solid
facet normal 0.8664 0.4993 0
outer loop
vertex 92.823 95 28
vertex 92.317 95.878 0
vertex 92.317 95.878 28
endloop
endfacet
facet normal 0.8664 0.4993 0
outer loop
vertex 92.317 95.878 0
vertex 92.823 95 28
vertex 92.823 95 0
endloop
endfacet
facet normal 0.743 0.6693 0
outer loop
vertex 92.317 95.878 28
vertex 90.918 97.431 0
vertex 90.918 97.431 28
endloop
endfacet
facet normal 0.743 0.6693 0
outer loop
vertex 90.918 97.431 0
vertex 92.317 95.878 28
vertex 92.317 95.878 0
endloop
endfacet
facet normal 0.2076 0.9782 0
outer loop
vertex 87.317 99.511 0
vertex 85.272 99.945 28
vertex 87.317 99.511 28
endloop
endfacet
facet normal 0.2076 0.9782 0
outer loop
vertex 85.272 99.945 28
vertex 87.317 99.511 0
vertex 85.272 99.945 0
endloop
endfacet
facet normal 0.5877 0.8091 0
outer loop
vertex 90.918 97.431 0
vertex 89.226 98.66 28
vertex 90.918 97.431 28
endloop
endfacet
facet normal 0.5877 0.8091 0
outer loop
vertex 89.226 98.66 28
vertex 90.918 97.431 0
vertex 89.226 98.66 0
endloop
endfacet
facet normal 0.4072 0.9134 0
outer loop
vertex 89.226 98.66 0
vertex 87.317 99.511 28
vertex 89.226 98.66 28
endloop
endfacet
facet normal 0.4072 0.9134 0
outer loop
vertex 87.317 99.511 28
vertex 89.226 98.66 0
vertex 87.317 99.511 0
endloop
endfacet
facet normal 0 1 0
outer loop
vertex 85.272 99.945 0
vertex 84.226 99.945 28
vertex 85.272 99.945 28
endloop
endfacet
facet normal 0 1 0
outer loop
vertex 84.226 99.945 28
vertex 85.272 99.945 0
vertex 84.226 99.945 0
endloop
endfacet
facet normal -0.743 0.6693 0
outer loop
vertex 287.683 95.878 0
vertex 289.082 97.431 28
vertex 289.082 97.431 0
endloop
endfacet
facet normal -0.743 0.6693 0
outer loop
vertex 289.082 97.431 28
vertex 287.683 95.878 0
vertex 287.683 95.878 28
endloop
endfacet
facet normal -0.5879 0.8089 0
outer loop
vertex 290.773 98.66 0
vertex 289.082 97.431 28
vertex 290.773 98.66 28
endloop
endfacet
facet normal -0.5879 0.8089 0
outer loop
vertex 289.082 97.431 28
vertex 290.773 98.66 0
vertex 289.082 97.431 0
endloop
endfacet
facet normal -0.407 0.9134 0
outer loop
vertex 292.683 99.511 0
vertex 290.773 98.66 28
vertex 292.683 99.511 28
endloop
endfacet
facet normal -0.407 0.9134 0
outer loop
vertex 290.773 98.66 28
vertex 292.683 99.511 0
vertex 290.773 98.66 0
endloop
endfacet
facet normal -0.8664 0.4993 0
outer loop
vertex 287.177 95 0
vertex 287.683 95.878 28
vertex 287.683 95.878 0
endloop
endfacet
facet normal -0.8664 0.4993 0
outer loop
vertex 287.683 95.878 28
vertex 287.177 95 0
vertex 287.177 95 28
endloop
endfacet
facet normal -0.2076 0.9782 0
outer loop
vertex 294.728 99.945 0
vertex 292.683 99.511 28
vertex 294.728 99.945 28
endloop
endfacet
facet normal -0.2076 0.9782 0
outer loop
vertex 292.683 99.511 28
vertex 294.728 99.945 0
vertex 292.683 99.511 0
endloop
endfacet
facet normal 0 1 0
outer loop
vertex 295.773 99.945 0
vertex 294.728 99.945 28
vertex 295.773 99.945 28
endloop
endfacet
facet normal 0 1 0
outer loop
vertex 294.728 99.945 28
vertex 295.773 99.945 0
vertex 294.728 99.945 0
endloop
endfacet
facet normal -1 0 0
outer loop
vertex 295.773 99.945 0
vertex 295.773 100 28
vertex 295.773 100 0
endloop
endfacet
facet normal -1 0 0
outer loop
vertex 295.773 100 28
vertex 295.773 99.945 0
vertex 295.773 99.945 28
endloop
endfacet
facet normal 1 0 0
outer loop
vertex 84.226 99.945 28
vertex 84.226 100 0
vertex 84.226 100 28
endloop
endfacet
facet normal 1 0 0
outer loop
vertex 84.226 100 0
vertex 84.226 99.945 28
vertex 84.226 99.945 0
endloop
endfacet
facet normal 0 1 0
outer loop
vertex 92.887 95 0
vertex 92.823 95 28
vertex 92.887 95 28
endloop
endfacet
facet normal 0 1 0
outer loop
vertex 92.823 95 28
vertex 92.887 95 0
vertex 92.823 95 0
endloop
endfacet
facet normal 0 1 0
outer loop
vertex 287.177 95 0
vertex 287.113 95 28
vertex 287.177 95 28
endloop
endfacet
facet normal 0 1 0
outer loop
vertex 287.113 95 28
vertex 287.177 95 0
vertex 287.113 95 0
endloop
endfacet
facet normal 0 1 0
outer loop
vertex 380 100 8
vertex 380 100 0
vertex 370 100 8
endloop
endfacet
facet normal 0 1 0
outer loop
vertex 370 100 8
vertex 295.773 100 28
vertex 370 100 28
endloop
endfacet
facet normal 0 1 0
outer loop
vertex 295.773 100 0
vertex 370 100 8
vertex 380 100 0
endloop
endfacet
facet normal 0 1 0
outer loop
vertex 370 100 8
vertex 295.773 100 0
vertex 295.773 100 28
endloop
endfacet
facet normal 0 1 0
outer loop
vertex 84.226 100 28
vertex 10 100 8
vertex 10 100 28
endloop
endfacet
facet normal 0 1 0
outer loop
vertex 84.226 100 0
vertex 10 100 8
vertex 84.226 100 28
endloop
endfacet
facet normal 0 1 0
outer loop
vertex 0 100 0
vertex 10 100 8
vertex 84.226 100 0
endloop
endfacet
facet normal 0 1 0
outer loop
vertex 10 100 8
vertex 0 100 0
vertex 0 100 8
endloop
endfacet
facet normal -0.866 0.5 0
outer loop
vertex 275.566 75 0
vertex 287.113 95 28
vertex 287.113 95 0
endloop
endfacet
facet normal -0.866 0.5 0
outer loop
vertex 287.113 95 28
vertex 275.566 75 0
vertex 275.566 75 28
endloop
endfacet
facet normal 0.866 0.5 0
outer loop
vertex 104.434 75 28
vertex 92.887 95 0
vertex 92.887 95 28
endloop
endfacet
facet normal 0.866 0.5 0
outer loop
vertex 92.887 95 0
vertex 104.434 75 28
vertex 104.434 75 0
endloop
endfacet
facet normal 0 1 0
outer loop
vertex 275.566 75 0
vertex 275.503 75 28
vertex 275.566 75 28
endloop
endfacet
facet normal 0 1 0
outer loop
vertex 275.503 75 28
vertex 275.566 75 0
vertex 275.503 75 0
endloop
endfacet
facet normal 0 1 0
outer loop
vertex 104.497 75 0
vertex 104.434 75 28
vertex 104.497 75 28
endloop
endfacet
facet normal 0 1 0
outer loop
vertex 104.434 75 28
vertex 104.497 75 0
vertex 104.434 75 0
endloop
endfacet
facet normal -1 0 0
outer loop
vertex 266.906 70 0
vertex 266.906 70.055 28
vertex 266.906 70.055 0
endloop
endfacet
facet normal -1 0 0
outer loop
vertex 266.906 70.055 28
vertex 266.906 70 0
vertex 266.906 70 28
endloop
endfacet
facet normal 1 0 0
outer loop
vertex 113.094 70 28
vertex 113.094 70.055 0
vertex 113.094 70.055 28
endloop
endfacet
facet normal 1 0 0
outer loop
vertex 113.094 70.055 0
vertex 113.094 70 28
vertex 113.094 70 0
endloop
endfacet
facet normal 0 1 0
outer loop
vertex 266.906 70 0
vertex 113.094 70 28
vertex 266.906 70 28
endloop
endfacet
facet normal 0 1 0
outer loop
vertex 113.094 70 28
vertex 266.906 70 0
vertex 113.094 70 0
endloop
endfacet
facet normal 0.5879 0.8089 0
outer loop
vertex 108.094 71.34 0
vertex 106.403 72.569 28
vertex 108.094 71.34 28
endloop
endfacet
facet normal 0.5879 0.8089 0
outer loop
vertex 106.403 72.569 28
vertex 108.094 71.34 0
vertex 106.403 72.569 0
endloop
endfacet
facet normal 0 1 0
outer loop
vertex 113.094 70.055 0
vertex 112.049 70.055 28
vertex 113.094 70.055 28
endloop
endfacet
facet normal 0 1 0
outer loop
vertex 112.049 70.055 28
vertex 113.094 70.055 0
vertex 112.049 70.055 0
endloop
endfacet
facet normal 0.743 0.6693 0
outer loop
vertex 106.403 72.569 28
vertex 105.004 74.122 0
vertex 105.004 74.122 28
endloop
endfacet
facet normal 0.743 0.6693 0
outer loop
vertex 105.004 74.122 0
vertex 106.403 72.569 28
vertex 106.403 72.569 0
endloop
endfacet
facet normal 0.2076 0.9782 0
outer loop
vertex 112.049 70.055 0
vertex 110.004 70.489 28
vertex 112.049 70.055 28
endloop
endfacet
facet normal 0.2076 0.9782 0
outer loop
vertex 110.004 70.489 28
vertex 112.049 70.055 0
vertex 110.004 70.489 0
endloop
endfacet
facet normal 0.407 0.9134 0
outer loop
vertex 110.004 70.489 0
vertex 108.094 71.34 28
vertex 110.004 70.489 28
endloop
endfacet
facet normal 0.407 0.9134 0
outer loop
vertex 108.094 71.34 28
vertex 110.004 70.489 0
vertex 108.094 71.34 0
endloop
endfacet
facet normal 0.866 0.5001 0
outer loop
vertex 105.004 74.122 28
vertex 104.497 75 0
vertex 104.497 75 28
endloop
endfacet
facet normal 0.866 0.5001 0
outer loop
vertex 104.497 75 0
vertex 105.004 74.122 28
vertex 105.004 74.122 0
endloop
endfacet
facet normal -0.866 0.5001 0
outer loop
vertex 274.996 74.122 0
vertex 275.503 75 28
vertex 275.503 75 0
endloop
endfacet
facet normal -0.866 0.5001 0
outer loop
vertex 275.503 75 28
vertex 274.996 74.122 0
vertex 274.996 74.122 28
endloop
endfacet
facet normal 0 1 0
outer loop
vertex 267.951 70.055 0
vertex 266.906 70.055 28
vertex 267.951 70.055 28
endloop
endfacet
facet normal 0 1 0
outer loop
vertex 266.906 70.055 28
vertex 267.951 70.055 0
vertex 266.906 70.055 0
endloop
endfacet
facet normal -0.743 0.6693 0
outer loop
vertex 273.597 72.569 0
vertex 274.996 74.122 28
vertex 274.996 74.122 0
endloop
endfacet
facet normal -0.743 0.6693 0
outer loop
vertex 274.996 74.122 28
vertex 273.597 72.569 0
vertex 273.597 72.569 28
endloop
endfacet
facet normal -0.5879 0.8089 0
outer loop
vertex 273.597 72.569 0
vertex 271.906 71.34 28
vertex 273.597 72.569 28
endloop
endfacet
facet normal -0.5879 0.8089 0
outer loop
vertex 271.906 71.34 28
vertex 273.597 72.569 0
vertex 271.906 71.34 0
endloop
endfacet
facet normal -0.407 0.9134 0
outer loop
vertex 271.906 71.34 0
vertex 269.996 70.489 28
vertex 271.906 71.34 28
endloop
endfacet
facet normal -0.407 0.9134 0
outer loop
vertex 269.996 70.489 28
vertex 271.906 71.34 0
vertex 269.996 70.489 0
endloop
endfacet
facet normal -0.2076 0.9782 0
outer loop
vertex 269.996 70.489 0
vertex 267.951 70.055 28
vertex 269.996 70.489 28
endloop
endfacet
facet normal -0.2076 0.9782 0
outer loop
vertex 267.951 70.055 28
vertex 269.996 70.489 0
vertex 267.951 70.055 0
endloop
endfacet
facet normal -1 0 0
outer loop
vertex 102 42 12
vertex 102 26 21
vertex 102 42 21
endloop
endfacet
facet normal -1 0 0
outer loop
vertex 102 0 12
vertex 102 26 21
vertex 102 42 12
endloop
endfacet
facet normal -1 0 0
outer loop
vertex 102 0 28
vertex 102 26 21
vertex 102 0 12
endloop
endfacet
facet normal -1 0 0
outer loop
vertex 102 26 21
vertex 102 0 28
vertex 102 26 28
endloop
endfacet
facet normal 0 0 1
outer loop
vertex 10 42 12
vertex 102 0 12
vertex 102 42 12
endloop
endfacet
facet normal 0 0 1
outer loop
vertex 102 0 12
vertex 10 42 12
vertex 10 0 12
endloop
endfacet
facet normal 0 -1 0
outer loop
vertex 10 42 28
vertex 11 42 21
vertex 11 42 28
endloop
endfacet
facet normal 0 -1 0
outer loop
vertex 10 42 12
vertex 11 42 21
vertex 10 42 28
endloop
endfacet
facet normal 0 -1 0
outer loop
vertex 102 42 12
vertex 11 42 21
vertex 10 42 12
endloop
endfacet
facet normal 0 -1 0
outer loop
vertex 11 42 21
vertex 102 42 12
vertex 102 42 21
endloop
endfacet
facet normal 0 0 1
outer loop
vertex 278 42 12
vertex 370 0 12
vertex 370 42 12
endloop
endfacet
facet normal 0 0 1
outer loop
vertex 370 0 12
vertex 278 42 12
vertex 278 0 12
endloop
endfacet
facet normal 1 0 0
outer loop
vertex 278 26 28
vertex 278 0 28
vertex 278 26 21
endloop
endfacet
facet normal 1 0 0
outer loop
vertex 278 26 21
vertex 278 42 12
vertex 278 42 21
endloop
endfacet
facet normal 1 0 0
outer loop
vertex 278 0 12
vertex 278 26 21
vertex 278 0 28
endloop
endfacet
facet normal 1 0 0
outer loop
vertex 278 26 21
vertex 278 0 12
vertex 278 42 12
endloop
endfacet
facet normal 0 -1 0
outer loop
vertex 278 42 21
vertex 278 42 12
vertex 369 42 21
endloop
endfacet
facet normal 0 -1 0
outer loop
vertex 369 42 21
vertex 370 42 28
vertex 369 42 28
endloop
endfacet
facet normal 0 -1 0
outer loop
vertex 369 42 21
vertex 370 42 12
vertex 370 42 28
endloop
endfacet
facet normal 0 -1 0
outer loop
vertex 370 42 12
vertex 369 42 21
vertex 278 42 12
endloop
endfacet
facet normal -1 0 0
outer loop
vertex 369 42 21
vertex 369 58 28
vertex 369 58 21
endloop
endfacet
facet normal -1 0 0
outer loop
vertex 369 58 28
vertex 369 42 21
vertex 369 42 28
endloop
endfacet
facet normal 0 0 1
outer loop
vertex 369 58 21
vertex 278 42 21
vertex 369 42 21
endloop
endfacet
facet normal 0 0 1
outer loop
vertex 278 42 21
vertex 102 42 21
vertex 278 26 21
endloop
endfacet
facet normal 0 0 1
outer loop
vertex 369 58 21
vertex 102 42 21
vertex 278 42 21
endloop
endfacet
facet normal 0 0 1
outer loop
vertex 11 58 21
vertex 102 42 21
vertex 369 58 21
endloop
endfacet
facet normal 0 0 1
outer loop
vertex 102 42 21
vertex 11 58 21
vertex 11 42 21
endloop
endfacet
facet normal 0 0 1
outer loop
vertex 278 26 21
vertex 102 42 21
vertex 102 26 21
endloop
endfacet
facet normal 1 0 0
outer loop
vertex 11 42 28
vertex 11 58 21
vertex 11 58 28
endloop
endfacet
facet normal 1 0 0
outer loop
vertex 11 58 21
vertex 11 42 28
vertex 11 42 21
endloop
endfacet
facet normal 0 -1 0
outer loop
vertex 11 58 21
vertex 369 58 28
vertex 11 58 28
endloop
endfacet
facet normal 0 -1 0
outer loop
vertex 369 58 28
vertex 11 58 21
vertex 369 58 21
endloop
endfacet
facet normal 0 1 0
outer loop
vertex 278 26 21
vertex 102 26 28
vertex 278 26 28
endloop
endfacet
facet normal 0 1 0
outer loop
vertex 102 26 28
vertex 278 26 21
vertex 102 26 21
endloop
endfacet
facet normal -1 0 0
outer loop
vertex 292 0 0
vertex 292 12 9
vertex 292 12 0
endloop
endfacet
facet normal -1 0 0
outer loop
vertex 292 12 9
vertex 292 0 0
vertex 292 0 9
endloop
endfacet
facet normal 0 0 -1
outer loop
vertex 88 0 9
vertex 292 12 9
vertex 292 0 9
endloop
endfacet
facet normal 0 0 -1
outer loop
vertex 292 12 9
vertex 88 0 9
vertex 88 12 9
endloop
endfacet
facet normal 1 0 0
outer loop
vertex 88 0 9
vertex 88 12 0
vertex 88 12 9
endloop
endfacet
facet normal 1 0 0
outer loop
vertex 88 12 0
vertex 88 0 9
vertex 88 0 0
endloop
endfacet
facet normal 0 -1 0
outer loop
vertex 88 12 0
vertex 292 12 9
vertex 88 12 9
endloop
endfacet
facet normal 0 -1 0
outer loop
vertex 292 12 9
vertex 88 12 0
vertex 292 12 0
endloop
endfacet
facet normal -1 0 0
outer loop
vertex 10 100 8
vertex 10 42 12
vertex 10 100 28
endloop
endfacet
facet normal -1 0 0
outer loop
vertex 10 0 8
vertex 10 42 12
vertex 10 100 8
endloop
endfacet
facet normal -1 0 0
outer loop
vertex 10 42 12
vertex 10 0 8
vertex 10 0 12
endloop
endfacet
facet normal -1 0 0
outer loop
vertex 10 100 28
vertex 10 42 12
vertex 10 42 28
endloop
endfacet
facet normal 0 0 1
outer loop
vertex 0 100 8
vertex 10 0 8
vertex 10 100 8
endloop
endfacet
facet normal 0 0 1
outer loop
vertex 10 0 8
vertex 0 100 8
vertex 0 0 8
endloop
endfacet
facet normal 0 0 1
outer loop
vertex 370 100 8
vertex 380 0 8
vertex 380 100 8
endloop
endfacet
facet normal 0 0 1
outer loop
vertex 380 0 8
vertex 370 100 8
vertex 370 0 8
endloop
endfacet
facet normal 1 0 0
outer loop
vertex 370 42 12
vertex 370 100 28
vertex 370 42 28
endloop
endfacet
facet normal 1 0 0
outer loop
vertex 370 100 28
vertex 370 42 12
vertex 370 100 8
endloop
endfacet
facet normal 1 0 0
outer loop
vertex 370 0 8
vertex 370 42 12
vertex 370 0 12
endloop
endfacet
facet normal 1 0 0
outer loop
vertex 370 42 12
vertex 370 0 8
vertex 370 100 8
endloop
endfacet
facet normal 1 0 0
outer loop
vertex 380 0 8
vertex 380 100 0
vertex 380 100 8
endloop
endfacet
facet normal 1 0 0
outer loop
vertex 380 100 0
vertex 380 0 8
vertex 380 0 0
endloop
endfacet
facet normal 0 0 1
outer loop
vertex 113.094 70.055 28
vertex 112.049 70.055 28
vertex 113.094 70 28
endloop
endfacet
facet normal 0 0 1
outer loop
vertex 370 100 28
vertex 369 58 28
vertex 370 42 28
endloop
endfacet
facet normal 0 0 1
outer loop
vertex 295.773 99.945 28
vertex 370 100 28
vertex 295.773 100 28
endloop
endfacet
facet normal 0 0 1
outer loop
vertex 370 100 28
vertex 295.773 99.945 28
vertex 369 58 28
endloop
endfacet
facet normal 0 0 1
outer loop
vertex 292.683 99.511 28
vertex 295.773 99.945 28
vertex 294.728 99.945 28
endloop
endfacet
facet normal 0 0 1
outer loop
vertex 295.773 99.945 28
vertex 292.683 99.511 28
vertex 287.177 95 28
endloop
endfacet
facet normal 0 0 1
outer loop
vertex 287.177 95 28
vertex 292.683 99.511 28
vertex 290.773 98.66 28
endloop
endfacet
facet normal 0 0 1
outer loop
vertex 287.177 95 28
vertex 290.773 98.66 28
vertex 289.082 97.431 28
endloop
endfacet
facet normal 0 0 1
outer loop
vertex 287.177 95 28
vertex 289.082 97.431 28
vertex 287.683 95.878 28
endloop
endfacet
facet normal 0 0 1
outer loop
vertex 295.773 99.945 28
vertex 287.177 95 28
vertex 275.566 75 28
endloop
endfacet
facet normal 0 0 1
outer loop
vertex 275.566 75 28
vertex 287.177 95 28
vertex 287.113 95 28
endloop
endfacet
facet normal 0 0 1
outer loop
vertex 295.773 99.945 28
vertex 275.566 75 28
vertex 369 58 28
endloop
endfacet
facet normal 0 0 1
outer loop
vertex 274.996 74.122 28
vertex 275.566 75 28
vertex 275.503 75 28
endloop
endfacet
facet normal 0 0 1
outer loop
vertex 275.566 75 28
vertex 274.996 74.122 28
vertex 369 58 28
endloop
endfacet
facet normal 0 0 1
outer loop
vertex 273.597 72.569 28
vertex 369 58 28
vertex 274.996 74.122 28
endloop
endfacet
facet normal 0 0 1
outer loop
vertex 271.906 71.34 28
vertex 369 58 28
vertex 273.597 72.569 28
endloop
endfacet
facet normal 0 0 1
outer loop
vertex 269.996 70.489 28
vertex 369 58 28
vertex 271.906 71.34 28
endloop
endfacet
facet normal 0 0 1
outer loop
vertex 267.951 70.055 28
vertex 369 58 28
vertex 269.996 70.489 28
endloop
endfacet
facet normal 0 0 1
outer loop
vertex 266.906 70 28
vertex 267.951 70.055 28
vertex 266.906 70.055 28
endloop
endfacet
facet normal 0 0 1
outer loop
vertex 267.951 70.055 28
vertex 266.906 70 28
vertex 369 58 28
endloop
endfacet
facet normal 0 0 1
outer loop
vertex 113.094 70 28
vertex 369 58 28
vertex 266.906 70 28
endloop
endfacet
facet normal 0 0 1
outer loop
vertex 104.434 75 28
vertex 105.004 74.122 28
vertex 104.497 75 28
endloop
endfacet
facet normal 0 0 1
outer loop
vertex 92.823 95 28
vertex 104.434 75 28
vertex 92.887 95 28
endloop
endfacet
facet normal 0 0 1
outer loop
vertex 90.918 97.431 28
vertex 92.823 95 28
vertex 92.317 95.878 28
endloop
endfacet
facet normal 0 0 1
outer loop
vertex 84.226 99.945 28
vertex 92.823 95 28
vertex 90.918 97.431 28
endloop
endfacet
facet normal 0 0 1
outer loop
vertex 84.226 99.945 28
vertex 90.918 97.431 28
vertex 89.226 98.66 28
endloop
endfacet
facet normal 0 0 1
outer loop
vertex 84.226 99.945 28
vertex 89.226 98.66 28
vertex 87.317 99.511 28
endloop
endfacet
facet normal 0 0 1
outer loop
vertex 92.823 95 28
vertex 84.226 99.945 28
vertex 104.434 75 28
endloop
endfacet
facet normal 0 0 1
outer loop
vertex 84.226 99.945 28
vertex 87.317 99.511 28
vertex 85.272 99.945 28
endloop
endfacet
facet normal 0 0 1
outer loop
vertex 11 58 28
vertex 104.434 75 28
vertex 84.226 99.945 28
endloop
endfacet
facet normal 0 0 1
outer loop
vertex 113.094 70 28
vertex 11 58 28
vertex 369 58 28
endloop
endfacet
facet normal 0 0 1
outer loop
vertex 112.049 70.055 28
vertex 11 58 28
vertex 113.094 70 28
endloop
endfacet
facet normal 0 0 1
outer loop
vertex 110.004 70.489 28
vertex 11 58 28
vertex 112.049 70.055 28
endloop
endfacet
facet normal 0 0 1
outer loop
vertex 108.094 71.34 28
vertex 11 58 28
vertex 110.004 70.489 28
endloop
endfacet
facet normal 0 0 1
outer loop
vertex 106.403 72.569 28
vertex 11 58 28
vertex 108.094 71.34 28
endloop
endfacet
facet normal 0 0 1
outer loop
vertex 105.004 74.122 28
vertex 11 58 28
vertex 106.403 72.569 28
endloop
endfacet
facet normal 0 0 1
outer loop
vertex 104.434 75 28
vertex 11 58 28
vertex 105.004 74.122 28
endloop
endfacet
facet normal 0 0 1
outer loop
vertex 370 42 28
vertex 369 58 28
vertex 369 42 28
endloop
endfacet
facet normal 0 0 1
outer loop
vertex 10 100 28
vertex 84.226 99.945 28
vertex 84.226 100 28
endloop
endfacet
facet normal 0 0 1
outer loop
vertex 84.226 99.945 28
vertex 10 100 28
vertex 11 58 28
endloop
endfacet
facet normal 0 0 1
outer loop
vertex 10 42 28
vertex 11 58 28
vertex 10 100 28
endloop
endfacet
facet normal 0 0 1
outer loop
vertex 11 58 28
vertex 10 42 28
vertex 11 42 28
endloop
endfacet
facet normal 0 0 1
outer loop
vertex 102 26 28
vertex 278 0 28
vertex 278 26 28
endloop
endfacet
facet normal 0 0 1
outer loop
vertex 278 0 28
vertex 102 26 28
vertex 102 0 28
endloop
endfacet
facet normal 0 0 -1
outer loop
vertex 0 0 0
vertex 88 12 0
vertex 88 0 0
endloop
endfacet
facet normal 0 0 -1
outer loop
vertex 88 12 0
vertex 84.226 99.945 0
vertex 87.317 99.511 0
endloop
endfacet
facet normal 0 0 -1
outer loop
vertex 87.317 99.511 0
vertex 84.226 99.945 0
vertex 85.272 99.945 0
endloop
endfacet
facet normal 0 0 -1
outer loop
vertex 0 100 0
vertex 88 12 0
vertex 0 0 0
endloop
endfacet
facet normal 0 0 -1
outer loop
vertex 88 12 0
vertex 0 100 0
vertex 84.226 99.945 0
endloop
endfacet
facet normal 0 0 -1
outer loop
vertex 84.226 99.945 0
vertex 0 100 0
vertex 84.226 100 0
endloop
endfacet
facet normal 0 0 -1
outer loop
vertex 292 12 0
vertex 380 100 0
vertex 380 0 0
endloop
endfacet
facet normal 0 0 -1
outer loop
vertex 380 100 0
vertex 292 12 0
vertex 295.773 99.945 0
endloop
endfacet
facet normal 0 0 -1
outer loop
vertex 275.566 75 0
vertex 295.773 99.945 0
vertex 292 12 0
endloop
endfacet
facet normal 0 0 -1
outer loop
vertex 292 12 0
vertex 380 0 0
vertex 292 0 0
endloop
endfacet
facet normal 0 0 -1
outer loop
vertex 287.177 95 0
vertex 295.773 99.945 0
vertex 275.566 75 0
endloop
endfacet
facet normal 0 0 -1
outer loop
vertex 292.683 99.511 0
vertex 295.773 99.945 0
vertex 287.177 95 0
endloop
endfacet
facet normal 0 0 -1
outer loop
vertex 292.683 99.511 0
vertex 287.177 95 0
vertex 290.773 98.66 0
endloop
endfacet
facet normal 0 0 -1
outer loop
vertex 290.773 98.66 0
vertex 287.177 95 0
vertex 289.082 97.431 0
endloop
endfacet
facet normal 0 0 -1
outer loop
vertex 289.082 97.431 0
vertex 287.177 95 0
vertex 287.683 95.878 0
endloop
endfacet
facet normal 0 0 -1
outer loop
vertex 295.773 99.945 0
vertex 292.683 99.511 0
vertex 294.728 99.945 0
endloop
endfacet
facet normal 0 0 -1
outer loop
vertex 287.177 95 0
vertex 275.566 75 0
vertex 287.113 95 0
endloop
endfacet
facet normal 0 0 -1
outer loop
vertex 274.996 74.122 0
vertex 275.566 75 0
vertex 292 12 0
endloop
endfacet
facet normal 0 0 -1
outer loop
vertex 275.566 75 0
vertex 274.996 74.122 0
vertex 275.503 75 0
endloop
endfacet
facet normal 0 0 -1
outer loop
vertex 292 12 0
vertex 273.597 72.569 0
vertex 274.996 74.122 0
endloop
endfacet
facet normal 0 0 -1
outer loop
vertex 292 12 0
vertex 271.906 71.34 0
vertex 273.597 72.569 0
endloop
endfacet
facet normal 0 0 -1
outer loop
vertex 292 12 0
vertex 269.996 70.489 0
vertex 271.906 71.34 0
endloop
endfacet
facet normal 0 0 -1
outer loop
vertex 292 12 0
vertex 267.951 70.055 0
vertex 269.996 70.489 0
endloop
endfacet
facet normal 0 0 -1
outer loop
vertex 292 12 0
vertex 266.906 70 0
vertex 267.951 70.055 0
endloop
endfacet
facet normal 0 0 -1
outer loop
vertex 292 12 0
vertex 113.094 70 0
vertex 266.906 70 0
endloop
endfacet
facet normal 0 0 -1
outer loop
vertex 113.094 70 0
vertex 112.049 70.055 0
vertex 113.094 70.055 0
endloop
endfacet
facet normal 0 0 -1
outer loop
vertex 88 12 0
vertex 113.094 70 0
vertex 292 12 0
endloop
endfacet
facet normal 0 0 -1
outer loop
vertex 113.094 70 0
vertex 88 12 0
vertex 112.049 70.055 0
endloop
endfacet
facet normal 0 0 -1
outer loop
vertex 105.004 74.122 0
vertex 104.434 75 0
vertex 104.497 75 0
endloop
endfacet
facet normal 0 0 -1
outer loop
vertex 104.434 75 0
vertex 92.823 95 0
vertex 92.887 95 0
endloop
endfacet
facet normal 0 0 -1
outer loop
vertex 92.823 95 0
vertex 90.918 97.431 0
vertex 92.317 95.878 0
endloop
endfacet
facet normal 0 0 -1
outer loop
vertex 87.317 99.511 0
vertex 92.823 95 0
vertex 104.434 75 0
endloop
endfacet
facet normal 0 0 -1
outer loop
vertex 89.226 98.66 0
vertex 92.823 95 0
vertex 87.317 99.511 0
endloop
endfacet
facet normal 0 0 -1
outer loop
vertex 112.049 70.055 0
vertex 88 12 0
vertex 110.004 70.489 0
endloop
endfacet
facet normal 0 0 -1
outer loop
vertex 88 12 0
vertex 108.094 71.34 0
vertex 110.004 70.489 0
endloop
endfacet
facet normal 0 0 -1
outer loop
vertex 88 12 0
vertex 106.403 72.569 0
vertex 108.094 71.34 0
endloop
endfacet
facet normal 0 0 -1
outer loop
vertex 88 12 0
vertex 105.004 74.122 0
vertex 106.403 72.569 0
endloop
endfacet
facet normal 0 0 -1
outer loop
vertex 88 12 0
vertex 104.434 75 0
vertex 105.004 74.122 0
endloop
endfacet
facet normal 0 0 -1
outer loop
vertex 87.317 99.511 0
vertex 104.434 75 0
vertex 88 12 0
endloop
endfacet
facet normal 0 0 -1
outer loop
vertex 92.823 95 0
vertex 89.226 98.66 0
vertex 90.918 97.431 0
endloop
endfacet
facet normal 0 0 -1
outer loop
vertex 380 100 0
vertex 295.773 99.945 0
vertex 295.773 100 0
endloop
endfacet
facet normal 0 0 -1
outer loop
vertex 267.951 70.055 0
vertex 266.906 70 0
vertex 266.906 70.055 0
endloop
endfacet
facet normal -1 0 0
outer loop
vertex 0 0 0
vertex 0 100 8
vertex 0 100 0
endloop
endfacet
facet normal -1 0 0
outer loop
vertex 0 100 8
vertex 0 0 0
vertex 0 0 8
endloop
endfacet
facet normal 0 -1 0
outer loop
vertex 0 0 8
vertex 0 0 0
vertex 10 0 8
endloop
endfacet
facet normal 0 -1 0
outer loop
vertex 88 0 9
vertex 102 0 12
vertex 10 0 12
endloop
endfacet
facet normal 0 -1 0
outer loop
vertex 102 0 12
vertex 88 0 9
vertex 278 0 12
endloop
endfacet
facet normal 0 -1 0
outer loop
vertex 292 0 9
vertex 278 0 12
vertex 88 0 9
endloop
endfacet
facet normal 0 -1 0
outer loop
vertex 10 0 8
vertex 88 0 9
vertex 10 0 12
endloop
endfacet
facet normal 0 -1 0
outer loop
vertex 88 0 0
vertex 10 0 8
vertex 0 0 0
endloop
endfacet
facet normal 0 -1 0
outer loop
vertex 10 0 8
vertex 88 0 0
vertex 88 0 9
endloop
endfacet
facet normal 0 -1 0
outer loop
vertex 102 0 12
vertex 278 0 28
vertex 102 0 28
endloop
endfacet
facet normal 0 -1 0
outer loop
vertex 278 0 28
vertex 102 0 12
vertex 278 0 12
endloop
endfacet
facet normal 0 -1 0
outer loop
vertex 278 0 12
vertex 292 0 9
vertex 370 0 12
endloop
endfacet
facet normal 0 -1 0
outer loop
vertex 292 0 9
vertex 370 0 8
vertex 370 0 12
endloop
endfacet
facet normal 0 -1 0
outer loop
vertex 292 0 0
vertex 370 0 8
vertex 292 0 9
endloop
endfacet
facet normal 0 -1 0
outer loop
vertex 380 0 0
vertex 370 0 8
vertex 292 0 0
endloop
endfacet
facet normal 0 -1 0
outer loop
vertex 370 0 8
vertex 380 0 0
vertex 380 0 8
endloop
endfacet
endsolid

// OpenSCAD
include <../src/wardrobe.scad>;
plank_yz_side_bottom();
//github_openscad -o wardrobe_3/plank_yz_side_bottom.stl -D wardrobe_n=3 -D cutting_edge=0 -D break_view_length=0 wardrobe_3/plank_yz_side_bottom_stl.scad
